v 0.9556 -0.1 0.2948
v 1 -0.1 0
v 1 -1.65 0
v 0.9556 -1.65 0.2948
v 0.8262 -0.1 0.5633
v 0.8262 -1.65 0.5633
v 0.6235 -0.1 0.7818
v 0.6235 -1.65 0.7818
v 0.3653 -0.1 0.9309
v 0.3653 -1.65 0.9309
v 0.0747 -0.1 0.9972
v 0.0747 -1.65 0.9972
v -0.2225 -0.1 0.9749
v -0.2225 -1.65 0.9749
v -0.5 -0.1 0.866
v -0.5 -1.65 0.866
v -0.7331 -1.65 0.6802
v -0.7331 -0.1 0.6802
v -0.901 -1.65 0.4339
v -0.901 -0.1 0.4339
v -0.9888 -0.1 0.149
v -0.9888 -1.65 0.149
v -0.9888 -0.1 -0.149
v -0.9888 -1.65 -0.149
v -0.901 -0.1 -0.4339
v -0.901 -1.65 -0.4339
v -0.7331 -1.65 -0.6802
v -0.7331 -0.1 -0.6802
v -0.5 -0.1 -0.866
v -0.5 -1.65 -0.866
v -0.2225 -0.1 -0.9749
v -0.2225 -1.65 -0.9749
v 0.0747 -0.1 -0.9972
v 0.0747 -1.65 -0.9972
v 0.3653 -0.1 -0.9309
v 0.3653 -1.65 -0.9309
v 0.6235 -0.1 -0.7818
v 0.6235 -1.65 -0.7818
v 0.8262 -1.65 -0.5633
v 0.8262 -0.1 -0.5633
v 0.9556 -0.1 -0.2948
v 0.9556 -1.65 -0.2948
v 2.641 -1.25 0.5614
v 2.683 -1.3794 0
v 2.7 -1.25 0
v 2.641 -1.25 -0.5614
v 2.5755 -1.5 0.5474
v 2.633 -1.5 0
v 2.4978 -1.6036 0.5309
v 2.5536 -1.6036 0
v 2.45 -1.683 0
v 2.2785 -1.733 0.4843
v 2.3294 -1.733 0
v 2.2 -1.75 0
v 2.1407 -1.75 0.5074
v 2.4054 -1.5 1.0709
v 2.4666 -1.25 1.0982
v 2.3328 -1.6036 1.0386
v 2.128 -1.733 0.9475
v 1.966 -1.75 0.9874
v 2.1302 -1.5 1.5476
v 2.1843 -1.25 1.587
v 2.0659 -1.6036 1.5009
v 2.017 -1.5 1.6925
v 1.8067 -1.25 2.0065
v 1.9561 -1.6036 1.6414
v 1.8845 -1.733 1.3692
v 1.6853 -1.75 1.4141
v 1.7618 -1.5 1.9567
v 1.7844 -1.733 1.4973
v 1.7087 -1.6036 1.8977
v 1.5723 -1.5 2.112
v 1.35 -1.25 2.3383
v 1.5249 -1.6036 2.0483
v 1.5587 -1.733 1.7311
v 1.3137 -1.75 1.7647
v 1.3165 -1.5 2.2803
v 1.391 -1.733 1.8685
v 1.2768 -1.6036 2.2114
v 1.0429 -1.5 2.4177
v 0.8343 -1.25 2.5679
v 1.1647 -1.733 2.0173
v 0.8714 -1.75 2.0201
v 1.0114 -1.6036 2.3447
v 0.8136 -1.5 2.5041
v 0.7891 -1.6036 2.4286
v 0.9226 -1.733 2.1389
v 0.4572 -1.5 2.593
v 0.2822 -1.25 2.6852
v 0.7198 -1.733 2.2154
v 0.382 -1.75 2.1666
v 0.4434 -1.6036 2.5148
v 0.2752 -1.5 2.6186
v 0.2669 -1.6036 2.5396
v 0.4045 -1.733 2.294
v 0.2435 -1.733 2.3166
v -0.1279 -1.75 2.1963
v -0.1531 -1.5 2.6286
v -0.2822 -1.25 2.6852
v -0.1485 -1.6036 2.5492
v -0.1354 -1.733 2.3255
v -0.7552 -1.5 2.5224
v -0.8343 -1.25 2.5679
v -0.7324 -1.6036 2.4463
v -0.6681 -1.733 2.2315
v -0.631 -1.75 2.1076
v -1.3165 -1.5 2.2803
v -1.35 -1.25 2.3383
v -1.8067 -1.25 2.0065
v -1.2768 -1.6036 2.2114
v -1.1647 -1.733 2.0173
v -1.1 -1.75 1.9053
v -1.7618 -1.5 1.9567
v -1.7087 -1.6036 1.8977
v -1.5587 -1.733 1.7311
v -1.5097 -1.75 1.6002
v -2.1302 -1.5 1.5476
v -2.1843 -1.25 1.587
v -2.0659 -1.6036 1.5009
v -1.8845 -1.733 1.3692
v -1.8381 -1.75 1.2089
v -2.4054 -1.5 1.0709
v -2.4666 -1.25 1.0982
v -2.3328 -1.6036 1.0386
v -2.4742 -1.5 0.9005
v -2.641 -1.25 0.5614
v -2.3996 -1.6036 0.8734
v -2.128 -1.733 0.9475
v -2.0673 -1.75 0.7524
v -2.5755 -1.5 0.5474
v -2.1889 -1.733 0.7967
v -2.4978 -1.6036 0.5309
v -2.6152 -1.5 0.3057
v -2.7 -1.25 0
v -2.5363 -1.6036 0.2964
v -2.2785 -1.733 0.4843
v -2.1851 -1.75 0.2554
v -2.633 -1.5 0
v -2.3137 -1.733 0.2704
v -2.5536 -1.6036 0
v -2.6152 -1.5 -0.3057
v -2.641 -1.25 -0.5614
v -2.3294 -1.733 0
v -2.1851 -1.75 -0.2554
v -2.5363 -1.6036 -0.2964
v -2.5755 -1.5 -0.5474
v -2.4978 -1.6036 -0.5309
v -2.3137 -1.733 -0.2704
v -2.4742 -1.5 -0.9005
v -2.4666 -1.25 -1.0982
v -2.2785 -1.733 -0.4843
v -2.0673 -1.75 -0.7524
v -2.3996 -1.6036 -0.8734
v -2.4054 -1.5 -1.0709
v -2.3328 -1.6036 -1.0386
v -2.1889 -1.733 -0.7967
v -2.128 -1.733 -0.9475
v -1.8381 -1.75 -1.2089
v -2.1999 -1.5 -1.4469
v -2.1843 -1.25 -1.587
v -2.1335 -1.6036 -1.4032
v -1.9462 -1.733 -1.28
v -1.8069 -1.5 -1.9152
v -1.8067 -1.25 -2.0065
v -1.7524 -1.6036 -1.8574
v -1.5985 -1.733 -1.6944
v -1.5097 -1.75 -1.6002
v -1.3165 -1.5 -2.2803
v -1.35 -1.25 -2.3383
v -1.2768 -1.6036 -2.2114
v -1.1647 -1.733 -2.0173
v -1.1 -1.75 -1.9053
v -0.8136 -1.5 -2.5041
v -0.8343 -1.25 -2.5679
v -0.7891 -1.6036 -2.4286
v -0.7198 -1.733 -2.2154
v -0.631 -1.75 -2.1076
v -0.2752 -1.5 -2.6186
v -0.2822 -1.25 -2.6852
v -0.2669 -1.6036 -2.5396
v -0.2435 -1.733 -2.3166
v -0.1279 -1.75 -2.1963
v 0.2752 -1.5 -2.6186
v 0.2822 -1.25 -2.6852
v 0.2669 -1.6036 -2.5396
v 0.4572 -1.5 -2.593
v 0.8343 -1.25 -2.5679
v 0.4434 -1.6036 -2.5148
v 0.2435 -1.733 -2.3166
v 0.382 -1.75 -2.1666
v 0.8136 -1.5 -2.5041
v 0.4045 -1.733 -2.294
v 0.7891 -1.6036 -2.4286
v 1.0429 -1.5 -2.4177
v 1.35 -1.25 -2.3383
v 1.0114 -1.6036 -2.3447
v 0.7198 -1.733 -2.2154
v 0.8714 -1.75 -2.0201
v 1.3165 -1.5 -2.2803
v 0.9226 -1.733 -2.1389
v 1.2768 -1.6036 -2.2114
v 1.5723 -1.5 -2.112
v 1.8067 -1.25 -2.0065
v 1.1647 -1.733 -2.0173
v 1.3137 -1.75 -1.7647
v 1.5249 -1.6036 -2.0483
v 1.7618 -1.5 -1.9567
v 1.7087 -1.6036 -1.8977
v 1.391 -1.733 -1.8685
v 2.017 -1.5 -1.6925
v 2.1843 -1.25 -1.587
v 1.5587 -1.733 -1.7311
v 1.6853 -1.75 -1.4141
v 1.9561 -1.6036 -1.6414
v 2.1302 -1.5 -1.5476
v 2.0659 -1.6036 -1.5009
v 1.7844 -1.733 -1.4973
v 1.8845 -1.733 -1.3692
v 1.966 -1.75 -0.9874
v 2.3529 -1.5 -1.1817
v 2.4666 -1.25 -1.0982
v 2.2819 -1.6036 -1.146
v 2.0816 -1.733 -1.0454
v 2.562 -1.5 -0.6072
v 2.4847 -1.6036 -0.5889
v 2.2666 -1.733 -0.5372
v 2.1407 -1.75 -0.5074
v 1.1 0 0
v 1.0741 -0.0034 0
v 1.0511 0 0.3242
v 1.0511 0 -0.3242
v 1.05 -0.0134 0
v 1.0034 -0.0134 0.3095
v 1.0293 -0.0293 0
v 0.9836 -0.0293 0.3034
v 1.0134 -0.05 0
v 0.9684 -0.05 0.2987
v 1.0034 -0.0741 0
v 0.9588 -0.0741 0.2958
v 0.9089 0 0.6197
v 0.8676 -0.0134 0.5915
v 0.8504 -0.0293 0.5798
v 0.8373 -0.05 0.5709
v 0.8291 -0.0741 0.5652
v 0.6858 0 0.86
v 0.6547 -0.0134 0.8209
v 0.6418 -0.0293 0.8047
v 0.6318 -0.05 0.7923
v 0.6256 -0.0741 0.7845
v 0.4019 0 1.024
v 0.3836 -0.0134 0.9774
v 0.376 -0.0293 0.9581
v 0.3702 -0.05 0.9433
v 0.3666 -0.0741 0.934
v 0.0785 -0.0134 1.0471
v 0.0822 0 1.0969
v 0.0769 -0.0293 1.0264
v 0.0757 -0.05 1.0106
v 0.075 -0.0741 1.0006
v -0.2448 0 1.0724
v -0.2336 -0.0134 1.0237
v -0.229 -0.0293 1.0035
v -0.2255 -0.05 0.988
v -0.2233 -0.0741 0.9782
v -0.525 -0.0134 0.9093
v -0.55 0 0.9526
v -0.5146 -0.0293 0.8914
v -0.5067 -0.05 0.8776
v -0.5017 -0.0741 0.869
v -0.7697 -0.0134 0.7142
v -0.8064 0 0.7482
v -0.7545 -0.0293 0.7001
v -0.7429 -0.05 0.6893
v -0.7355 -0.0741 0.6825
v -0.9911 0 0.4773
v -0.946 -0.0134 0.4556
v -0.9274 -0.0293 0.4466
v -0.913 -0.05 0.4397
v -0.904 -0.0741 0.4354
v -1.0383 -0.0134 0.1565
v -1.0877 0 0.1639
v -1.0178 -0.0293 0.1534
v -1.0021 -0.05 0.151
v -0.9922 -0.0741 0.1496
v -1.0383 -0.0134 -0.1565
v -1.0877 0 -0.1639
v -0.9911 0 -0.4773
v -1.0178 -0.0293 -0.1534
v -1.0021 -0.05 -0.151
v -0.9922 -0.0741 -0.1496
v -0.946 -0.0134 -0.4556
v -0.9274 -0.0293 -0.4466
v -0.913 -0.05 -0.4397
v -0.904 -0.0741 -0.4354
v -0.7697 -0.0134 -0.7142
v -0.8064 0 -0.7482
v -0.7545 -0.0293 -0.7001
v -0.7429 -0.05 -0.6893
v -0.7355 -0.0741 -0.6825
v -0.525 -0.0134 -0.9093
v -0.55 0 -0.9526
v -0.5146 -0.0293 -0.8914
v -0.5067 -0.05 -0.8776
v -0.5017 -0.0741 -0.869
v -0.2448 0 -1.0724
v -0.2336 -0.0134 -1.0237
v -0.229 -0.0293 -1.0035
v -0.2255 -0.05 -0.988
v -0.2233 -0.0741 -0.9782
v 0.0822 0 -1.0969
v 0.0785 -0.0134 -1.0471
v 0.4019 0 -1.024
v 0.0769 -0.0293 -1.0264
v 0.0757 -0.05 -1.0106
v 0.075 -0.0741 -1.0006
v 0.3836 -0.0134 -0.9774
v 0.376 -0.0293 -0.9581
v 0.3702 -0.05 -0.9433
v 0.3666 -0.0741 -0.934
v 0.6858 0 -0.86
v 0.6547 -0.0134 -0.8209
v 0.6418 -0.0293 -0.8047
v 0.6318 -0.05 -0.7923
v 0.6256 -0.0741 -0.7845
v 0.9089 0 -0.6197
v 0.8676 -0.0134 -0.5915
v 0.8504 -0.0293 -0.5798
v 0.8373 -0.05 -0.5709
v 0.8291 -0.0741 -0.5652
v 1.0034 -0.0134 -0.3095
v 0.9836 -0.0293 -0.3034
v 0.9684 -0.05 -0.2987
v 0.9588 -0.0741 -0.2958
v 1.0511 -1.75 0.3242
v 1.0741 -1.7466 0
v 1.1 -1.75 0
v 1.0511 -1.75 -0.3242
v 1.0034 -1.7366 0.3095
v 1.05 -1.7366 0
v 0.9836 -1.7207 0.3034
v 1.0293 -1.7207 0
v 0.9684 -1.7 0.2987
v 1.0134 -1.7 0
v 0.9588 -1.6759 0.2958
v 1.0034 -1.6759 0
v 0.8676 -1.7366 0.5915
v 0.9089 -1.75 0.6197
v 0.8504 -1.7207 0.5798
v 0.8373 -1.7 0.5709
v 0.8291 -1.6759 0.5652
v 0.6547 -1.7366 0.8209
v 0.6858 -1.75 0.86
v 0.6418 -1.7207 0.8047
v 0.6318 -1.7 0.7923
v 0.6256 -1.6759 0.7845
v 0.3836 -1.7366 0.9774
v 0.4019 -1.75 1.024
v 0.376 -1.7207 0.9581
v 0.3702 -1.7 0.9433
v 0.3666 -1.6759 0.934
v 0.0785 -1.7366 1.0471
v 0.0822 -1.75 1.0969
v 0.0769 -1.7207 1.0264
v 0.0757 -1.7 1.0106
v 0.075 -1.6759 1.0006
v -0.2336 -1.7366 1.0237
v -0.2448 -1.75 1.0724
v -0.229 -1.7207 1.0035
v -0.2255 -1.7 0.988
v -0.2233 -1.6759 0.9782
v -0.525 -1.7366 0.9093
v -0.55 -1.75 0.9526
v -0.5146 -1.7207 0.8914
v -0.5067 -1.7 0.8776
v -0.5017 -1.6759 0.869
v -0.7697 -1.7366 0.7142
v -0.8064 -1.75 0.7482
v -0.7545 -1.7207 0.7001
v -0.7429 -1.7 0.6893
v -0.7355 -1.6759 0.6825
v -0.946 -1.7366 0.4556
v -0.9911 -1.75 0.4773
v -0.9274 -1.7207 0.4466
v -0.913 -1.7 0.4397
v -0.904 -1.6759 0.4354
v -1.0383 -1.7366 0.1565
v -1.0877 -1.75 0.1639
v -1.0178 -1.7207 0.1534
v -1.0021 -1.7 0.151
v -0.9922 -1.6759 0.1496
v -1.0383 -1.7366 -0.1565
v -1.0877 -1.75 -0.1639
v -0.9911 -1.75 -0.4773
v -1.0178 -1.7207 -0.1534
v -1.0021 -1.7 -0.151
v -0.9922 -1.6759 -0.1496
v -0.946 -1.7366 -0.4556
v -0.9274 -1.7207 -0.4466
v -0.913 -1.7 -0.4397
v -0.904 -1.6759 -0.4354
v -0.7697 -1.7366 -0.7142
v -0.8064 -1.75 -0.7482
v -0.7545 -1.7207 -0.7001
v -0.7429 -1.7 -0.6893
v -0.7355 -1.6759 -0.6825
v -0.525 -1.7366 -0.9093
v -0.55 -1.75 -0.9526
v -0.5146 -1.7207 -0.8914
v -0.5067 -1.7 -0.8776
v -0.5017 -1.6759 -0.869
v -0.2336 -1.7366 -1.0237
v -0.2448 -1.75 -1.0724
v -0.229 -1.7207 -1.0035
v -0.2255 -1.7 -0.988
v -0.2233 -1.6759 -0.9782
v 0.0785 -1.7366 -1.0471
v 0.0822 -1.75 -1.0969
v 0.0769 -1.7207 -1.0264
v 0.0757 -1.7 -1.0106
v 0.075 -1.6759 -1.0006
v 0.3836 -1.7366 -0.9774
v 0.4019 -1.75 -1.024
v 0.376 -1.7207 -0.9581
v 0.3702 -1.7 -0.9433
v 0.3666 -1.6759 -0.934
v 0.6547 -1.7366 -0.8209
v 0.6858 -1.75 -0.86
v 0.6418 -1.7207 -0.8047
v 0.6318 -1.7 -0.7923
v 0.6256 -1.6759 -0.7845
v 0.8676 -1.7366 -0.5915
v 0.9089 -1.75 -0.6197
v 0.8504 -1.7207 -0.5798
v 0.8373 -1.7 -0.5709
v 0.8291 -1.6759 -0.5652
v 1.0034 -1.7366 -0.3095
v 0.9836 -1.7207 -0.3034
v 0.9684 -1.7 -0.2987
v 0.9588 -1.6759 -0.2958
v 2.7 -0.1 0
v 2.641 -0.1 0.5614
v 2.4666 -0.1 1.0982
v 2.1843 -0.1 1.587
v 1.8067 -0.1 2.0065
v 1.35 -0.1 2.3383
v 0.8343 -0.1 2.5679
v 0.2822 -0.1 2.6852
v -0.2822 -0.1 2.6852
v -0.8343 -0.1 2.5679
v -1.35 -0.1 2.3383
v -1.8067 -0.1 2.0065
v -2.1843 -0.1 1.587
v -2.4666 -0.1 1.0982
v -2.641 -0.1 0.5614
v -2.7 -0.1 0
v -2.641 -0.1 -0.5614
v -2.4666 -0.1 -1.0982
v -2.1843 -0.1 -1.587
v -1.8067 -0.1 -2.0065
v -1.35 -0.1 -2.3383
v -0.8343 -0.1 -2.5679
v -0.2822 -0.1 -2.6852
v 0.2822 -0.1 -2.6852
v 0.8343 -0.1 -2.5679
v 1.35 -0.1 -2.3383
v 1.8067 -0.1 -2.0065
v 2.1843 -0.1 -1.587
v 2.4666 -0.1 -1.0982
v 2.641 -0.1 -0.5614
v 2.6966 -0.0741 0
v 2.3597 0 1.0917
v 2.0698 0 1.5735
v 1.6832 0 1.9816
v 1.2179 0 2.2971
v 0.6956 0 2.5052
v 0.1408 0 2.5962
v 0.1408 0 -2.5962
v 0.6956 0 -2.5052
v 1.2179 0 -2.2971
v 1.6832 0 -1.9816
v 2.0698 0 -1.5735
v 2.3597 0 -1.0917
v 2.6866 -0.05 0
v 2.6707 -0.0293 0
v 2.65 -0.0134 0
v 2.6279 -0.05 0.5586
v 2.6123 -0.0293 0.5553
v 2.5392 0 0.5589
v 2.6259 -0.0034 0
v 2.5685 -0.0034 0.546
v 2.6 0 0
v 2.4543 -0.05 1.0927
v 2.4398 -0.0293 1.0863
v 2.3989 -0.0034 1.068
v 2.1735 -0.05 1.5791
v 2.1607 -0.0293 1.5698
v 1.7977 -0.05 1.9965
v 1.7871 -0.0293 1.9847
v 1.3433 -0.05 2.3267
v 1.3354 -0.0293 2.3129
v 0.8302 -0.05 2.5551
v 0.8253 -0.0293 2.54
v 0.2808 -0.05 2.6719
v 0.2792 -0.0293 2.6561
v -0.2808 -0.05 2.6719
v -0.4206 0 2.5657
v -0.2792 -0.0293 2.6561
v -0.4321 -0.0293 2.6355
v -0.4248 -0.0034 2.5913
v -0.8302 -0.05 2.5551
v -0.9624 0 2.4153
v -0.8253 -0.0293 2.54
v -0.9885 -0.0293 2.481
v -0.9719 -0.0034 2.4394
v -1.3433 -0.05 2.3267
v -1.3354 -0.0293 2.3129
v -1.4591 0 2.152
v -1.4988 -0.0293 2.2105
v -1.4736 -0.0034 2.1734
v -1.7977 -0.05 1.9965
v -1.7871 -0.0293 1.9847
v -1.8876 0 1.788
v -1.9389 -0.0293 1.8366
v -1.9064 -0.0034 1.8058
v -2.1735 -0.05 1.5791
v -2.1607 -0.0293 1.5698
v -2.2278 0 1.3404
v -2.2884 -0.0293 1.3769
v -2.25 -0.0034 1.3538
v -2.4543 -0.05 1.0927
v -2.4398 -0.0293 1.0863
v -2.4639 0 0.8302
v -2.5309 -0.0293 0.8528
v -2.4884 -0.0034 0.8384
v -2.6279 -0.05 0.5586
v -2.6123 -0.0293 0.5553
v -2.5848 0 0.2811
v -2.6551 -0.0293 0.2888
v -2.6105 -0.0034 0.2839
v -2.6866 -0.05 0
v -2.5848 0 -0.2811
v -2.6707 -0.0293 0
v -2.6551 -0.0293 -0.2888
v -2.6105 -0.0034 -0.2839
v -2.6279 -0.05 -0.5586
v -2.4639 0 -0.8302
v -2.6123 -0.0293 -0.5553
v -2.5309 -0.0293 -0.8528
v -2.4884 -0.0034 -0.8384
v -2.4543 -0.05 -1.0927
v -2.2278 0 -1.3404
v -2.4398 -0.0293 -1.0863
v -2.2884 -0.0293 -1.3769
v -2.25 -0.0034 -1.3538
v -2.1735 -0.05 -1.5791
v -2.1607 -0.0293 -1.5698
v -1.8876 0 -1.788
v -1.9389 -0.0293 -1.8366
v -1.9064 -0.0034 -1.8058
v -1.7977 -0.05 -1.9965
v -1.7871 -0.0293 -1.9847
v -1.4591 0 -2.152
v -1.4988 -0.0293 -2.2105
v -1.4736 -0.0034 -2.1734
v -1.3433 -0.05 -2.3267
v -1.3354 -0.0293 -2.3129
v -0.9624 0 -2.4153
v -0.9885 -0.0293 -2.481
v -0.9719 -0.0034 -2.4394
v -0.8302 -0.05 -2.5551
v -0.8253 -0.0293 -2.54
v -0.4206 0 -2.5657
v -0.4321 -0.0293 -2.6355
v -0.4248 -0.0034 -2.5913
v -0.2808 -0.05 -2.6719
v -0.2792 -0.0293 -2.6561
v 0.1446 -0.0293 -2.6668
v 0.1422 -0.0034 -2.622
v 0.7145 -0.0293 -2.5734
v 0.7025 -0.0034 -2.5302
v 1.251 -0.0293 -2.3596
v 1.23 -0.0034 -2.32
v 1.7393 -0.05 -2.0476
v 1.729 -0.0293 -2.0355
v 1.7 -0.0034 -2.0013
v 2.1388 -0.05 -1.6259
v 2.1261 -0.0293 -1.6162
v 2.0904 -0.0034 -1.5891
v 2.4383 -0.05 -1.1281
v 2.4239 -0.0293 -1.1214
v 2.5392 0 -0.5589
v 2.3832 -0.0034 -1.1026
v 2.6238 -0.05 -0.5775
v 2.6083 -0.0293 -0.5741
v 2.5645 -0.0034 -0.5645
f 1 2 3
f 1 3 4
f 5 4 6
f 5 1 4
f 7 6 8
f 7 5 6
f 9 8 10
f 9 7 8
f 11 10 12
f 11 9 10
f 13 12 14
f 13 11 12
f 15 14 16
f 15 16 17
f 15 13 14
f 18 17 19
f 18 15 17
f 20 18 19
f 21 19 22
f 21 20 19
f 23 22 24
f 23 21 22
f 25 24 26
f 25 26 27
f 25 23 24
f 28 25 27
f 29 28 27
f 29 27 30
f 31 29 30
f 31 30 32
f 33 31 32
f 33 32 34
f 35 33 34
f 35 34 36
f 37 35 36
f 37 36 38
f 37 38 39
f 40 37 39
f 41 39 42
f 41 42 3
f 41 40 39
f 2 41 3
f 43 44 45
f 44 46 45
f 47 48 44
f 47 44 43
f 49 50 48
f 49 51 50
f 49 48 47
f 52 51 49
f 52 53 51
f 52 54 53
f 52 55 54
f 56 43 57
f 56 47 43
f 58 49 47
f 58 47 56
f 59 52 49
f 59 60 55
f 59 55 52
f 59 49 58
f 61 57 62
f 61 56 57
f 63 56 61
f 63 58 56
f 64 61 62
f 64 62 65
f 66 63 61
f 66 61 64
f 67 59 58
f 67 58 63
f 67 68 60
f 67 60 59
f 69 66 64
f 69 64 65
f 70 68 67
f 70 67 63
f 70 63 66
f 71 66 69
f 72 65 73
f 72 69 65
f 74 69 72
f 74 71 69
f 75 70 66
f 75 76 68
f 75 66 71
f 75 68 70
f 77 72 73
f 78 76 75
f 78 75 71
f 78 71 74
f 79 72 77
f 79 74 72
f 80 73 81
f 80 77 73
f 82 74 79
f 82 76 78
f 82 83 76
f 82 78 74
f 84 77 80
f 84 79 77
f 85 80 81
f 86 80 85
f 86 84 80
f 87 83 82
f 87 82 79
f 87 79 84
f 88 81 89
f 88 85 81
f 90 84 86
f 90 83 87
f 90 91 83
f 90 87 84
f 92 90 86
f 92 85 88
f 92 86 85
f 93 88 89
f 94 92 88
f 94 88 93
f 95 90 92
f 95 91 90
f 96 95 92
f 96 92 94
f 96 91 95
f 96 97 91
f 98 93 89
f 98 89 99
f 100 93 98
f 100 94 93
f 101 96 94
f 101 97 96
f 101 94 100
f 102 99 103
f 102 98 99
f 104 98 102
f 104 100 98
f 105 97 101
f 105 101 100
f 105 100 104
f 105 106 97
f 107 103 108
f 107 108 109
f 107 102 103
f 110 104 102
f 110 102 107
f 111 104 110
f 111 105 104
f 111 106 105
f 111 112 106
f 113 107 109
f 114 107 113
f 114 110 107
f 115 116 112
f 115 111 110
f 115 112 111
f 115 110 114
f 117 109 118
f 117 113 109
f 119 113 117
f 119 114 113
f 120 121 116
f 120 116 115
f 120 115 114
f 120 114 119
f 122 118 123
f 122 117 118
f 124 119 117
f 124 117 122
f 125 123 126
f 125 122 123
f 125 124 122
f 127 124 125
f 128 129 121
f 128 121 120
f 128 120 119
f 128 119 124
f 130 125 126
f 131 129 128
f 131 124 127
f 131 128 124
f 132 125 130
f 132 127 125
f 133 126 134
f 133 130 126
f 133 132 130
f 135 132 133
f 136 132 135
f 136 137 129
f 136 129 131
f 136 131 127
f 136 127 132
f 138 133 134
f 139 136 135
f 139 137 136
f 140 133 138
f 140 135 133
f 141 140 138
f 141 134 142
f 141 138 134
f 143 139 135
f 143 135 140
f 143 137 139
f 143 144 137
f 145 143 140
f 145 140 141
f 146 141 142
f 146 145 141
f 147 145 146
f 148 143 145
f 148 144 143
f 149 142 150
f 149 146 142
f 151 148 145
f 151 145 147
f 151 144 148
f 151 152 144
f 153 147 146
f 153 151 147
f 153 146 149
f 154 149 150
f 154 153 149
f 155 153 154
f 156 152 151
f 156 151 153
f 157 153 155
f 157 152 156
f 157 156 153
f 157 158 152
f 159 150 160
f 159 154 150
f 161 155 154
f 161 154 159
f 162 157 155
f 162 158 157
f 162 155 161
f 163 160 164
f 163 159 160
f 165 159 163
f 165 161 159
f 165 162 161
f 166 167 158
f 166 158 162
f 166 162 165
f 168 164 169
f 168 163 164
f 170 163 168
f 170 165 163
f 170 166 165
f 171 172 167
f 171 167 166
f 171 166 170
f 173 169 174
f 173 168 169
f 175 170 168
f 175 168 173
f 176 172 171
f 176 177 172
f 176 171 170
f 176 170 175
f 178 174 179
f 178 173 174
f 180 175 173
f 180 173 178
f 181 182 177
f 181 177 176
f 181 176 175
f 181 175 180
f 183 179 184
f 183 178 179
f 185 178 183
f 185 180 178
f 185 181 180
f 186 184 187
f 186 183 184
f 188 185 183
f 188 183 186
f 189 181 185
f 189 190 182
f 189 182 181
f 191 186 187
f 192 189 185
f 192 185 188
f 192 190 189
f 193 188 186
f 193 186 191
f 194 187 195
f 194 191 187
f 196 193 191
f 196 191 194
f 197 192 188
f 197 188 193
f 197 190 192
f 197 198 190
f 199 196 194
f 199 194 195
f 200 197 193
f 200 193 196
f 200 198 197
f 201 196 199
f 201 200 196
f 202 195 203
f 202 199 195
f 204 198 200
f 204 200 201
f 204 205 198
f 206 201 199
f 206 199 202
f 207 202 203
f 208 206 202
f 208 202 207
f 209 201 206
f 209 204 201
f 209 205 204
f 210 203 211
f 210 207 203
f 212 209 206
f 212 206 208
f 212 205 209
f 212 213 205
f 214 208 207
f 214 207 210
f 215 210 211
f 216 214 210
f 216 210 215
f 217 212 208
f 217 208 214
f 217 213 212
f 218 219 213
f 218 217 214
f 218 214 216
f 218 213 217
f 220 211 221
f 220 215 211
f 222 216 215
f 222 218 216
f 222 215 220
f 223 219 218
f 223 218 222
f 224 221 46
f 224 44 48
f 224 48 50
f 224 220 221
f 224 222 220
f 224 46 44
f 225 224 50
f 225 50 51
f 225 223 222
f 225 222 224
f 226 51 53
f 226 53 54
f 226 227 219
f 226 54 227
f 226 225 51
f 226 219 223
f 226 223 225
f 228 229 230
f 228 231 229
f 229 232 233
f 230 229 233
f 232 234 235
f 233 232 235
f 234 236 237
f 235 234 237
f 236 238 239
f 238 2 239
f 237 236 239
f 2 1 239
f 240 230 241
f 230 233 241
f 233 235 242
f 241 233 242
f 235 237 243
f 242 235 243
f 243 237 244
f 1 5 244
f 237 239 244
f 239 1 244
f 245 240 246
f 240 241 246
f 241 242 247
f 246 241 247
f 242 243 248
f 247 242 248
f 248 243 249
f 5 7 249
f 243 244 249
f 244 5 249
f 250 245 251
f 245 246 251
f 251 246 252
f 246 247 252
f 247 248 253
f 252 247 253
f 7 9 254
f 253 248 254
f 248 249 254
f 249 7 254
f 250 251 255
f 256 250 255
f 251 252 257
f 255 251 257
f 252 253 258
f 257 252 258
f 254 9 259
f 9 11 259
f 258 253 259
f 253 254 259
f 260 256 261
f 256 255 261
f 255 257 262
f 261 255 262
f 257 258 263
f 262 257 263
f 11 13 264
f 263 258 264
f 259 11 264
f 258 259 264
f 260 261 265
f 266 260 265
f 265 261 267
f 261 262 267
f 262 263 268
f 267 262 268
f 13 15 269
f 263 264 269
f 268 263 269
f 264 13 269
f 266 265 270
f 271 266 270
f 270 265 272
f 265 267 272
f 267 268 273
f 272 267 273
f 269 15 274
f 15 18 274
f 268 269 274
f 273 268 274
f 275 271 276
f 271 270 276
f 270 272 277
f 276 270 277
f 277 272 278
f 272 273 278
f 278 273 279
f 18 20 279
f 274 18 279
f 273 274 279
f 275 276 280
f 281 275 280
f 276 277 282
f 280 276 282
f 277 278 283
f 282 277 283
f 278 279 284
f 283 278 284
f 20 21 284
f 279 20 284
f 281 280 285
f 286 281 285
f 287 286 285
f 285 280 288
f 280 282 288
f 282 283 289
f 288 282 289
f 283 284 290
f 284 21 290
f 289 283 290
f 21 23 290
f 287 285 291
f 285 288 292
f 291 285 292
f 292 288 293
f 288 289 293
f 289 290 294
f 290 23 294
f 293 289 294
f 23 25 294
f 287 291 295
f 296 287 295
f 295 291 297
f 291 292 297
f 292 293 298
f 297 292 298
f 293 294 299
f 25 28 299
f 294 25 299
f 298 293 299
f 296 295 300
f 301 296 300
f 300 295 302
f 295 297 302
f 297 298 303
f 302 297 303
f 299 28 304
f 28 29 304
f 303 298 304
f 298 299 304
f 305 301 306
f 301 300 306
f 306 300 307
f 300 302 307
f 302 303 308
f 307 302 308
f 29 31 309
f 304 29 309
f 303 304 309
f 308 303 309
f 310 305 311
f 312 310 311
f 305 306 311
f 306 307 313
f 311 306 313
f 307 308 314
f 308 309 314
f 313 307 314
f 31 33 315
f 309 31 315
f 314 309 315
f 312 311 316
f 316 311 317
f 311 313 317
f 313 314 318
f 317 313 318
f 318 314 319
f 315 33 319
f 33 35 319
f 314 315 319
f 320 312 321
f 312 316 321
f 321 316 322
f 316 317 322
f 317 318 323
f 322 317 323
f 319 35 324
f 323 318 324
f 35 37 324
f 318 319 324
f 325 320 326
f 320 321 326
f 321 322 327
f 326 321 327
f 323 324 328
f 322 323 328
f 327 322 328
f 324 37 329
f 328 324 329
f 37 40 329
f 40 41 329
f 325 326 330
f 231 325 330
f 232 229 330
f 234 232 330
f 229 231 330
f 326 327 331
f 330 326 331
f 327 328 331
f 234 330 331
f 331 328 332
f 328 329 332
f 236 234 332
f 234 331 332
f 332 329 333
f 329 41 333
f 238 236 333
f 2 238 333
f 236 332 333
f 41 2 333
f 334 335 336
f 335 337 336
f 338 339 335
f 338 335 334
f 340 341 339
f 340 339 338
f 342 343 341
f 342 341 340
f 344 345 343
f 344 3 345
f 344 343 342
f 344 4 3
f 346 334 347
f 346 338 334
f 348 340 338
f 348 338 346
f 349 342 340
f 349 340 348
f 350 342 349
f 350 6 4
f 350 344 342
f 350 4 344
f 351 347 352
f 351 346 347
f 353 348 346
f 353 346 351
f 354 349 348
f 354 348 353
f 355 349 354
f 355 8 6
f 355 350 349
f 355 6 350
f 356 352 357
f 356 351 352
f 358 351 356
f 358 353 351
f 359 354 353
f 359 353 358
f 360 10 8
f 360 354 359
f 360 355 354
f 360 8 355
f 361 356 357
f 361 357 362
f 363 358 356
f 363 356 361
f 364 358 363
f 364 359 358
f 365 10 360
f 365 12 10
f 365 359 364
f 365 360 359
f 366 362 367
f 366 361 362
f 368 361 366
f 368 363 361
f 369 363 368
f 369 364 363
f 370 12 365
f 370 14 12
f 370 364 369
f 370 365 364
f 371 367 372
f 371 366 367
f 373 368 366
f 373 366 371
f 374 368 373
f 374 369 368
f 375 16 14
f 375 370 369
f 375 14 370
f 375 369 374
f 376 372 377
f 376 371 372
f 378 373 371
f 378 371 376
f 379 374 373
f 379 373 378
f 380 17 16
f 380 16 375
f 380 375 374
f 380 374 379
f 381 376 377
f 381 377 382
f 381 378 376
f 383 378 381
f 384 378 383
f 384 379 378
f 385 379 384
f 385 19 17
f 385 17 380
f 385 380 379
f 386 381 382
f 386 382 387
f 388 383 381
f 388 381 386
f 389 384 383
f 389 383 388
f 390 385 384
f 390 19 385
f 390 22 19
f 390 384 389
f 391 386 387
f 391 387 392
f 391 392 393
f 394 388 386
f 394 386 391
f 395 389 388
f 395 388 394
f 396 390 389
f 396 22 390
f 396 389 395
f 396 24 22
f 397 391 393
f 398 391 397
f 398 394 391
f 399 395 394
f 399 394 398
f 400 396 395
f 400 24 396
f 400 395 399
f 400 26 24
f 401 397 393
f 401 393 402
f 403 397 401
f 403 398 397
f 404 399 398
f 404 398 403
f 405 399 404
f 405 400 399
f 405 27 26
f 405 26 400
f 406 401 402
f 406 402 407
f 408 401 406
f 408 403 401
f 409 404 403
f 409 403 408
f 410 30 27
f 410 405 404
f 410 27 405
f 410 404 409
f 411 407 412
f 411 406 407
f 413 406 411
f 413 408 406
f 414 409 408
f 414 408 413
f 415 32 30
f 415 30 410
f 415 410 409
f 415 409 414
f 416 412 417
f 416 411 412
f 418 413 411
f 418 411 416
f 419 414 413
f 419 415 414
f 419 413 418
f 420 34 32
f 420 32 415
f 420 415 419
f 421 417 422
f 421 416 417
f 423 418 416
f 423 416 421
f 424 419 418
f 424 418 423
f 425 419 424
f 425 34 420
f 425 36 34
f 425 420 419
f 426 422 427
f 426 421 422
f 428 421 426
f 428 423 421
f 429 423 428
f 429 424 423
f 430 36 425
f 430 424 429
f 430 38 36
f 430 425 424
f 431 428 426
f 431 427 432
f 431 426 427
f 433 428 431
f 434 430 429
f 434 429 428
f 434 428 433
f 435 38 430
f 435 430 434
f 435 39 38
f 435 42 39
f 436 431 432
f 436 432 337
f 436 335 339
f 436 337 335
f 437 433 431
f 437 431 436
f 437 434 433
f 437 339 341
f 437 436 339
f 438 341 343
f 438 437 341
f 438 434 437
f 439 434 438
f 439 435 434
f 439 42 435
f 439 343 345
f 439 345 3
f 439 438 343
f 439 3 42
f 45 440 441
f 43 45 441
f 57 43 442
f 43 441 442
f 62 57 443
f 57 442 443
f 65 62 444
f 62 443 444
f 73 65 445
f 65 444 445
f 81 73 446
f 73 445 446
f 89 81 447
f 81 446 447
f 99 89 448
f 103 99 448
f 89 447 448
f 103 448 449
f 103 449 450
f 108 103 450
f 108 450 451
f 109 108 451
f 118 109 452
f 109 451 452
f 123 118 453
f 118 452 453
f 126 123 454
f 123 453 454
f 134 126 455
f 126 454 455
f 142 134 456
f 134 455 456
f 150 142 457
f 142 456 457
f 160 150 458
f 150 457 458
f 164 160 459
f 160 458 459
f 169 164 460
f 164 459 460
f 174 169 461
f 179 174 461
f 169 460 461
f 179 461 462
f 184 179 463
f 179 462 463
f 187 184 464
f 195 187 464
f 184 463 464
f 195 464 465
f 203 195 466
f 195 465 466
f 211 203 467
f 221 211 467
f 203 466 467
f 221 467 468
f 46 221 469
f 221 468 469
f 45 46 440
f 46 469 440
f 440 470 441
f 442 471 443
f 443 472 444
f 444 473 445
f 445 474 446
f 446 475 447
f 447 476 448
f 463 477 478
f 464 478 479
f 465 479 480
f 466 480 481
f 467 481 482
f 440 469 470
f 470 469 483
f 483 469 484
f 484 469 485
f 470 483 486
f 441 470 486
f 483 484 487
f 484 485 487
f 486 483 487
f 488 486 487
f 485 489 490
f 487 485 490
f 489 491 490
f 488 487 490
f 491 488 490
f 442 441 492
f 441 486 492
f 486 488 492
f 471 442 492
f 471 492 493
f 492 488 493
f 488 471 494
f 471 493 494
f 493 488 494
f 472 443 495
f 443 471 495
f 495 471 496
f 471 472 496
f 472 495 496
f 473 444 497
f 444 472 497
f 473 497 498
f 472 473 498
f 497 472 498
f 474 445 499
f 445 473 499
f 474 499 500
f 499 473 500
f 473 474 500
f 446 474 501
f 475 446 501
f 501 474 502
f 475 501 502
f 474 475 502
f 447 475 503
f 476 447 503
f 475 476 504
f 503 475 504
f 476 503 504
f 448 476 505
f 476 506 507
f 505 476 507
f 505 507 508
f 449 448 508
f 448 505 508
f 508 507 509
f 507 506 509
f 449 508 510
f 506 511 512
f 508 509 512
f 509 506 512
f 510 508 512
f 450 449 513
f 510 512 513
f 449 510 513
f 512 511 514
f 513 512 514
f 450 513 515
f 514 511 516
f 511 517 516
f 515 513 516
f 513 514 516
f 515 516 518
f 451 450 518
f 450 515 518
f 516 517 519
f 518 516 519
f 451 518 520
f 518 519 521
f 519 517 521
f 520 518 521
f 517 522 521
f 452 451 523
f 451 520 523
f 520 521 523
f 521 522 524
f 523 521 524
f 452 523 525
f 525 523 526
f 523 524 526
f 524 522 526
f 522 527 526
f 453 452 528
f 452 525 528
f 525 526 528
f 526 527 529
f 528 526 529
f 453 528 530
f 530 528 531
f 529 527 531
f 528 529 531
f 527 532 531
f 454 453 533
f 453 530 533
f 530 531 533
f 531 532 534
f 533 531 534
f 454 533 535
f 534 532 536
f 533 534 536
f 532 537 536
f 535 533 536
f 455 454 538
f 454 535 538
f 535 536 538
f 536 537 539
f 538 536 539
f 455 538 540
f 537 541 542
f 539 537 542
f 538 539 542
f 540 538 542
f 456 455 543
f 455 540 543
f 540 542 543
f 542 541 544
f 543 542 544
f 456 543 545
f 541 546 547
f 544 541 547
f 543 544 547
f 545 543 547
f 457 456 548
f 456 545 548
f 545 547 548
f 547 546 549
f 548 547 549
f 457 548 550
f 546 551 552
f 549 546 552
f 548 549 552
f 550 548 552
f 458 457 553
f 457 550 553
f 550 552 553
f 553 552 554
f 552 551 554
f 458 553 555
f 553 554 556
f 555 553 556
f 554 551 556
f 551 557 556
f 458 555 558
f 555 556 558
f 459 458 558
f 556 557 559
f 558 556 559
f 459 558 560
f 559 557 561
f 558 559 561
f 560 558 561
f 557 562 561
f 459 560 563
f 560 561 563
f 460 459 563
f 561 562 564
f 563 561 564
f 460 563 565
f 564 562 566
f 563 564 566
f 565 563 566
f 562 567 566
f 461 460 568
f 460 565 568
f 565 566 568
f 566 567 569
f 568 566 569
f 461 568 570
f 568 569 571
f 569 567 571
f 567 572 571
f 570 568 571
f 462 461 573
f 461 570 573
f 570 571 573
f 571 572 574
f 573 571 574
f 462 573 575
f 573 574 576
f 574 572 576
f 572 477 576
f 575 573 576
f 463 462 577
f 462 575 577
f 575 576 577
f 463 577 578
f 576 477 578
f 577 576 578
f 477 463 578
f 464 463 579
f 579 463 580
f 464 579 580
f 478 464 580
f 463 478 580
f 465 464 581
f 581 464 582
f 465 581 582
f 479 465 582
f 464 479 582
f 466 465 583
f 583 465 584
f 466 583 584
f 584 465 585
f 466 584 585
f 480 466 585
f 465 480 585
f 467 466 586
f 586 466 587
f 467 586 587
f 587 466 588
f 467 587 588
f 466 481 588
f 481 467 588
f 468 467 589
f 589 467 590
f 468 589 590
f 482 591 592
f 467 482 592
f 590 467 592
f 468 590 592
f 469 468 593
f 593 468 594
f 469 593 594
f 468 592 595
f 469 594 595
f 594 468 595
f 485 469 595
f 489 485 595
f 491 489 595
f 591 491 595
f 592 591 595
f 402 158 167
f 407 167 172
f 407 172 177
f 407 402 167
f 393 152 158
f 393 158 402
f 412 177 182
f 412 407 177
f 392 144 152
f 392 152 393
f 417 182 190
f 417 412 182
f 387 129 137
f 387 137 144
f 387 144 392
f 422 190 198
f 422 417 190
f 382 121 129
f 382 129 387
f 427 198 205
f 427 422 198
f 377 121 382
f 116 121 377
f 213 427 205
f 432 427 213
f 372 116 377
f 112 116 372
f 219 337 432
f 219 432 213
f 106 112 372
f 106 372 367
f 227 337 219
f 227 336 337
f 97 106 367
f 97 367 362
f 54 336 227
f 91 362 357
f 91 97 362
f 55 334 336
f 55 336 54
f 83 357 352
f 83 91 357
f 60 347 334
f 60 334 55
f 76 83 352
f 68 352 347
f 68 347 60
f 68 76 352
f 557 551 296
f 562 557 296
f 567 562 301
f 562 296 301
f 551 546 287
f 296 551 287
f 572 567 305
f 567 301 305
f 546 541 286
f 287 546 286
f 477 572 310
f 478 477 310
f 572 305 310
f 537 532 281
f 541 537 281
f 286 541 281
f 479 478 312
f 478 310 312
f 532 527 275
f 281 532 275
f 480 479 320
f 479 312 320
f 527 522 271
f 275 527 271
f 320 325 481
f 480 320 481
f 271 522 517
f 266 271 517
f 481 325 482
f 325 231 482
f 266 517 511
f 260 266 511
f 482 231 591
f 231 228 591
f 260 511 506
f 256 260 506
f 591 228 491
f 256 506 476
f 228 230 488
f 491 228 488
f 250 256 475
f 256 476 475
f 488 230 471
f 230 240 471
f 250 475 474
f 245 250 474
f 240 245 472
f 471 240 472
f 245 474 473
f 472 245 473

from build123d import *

# Parameters (mm, degrees)
F0_R     = 2.7
F0_R_2   = 1
F1_DEPTH = 1.75
F2_R     = 0.5
F3_R     = 0.1


with BuildPart() as f1:
    # F0 (on Front) → F1 (new body)
    with BuildSketch(Plane.XZ):
        Circle(F0_R)
        Circle(F0_R_2, mode=Mode.SUBTRACT)
    extrude(amount=F1_DEPTH)

    # F2
    f2_edges = [f1.edges().sort_by_distance(p)[0] for p in [
        (-2.7, -1.75, 0),
    ]]
    fillet(f2_edges, radius=F2_R)

    # F3
    f3_edges = [f1.edges().sort_by_distance(p)[0] for p in [
        (-1, -1.75, 0),
        (-2.7, 0, 0),
        (-1, 0, 0),
    ]]
    fillet(f3_edges, radius=F3_R)


solid = f1.part
